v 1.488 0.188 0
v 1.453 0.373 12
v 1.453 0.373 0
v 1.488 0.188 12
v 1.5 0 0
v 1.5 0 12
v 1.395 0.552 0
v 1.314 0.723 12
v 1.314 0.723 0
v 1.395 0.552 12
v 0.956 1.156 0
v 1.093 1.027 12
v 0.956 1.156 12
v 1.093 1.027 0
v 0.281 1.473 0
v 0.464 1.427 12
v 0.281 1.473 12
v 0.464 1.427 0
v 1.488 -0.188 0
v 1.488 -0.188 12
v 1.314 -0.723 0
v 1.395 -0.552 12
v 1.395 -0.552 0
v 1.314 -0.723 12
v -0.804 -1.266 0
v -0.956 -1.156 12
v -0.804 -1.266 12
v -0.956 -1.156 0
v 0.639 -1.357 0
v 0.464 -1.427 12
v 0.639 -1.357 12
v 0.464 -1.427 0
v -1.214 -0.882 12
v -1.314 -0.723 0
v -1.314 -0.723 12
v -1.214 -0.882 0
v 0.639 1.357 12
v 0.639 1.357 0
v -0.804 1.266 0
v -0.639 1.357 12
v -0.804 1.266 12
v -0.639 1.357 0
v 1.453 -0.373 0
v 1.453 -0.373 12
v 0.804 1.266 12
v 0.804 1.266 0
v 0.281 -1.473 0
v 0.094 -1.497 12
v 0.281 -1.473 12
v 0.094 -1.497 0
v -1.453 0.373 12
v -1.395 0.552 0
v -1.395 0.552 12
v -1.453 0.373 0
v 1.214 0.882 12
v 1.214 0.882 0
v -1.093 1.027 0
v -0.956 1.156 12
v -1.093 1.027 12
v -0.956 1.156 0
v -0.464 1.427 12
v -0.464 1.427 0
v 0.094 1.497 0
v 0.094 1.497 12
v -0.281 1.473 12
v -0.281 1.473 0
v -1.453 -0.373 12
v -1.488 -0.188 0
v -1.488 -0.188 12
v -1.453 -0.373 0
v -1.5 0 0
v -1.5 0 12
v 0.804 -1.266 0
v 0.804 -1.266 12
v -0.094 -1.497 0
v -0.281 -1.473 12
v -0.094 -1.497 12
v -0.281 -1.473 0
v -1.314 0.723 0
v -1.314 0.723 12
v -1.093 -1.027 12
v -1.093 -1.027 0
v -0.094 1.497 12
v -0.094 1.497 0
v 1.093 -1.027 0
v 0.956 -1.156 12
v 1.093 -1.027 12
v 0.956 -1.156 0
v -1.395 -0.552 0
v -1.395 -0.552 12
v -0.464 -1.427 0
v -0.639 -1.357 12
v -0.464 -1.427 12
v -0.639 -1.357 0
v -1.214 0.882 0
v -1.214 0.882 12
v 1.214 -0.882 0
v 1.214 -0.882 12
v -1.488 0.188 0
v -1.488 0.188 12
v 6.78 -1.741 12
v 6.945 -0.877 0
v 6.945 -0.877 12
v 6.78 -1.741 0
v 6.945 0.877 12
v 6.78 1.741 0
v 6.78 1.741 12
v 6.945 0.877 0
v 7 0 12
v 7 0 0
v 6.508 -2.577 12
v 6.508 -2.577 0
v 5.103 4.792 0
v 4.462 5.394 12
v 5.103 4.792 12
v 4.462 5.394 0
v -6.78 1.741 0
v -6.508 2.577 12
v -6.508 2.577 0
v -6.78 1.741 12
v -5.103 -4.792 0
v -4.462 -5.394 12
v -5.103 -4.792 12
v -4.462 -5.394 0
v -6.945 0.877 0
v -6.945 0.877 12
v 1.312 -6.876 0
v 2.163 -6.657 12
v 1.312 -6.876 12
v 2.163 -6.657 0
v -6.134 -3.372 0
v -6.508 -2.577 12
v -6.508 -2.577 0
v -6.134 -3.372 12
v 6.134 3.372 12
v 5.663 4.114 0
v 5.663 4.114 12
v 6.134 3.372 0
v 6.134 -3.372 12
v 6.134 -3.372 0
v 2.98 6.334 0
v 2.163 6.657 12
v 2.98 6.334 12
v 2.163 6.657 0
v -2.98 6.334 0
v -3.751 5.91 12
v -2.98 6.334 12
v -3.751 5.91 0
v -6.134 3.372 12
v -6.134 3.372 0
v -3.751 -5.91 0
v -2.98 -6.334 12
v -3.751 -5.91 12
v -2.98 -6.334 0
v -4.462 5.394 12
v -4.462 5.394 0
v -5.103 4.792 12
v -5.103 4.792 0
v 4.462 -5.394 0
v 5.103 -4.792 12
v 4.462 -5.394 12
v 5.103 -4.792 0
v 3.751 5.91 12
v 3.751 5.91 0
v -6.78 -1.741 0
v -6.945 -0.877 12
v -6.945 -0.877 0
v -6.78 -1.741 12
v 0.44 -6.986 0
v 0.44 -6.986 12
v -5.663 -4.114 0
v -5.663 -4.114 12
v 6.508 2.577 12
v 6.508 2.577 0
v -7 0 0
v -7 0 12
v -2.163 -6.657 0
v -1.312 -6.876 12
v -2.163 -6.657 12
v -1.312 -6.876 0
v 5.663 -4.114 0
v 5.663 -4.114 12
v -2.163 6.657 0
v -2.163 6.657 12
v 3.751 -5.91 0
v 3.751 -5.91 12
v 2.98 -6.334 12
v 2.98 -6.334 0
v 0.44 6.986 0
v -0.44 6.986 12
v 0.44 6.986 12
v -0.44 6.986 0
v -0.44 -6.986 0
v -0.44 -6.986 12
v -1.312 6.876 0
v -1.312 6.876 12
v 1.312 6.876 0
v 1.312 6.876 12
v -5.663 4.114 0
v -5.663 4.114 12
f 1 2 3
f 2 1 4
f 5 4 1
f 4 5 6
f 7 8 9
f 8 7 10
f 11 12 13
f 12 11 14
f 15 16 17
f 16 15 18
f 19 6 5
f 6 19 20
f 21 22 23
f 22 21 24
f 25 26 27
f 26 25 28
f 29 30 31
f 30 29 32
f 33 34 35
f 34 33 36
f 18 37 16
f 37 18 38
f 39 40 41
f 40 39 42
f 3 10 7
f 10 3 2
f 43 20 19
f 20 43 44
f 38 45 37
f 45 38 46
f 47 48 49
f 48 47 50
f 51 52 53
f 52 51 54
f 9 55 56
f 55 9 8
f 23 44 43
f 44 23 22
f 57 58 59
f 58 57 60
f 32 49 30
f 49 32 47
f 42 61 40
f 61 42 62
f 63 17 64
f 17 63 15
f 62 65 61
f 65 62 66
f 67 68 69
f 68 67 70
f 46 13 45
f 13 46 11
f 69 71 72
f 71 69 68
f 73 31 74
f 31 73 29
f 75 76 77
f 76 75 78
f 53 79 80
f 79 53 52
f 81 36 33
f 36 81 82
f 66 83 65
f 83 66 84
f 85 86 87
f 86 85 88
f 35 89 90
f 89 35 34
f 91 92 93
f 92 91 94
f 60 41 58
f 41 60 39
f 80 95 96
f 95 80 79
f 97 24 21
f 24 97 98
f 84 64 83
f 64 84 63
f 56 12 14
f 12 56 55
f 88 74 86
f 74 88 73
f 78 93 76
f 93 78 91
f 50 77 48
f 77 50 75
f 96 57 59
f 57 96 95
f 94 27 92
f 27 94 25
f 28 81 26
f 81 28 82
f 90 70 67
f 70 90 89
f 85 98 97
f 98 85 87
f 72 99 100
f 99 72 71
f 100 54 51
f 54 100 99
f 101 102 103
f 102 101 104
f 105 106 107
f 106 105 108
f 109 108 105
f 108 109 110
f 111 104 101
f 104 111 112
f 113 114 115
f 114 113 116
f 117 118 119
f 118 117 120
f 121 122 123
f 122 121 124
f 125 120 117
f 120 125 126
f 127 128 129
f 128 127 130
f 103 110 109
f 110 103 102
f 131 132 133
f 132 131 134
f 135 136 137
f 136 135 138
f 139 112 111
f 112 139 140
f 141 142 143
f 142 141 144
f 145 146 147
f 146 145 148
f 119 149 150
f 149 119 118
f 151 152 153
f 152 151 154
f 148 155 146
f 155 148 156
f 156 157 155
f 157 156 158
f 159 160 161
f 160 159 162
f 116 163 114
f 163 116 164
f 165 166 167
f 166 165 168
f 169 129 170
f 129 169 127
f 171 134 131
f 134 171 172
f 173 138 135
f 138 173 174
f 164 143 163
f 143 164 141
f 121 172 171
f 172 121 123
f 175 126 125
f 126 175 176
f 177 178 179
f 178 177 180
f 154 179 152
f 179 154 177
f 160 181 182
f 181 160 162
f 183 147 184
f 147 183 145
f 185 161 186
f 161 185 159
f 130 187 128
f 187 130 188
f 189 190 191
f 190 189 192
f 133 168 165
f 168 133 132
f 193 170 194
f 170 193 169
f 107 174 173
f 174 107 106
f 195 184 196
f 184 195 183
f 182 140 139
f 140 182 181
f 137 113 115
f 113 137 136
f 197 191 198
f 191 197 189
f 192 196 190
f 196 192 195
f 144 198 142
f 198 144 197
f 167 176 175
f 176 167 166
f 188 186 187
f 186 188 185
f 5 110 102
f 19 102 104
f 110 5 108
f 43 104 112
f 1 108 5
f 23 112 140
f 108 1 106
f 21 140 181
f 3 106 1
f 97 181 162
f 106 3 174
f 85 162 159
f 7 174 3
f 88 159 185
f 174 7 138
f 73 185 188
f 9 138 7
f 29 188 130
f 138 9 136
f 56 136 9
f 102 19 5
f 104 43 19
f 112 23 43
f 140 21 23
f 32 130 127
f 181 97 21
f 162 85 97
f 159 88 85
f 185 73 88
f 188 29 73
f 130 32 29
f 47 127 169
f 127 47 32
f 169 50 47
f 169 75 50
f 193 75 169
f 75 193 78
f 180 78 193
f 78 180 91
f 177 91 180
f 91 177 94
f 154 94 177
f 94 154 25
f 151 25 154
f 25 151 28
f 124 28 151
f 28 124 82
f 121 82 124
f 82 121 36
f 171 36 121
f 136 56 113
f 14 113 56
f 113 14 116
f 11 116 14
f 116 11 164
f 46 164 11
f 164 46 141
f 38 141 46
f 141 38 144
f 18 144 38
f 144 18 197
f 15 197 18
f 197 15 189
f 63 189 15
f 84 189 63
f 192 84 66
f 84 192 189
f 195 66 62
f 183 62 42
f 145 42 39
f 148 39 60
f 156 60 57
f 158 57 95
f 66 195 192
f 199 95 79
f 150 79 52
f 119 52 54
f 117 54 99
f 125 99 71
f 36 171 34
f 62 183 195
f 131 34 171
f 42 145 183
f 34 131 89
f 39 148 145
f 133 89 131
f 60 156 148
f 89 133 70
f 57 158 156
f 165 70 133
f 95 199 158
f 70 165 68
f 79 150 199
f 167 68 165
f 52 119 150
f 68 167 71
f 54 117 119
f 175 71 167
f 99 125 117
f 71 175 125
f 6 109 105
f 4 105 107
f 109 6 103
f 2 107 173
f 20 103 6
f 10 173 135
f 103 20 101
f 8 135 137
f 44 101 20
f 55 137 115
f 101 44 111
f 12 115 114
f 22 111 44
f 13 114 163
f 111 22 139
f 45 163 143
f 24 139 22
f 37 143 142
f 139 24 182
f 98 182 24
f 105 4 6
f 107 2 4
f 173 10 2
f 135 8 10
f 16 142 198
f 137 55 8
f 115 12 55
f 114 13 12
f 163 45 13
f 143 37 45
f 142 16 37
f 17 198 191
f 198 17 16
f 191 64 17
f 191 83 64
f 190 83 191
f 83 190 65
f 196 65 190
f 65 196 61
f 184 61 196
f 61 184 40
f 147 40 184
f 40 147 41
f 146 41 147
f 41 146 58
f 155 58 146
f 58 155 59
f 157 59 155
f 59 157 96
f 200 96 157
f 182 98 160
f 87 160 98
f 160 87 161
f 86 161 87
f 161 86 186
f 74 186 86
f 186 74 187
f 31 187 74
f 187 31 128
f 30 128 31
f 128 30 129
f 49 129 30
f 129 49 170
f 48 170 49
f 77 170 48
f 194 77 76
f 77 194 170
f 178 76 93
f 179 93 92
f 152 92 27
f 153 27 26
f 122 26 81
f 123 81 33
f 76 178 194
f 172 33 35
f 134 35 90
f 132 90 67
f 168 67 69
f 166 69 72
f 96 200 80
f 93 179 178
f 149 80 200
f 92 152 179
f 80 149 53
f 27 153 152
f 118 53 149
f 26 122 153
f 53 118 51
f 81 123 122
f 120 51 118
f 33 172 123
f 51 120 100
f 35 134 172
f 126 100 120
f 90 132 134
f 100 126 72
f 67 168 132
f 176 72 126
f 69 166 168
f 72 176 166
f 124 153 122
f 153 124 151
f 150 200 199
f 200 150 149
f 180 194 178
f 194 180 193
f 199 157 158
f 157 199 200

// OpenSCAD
$fn = 50;


difference() {
	union() {
		cylinder(h = 12, r = 7.0000000000);
	}
	union() {
		translate(v = [0, 0, -100]) {
			cylinder(h = 200, r = 1.5000000000);
		}
		translate(v = [0, 0, -100]) {
			cylinder(h = 200, r = 1.5000000000);
		}
	}
}
